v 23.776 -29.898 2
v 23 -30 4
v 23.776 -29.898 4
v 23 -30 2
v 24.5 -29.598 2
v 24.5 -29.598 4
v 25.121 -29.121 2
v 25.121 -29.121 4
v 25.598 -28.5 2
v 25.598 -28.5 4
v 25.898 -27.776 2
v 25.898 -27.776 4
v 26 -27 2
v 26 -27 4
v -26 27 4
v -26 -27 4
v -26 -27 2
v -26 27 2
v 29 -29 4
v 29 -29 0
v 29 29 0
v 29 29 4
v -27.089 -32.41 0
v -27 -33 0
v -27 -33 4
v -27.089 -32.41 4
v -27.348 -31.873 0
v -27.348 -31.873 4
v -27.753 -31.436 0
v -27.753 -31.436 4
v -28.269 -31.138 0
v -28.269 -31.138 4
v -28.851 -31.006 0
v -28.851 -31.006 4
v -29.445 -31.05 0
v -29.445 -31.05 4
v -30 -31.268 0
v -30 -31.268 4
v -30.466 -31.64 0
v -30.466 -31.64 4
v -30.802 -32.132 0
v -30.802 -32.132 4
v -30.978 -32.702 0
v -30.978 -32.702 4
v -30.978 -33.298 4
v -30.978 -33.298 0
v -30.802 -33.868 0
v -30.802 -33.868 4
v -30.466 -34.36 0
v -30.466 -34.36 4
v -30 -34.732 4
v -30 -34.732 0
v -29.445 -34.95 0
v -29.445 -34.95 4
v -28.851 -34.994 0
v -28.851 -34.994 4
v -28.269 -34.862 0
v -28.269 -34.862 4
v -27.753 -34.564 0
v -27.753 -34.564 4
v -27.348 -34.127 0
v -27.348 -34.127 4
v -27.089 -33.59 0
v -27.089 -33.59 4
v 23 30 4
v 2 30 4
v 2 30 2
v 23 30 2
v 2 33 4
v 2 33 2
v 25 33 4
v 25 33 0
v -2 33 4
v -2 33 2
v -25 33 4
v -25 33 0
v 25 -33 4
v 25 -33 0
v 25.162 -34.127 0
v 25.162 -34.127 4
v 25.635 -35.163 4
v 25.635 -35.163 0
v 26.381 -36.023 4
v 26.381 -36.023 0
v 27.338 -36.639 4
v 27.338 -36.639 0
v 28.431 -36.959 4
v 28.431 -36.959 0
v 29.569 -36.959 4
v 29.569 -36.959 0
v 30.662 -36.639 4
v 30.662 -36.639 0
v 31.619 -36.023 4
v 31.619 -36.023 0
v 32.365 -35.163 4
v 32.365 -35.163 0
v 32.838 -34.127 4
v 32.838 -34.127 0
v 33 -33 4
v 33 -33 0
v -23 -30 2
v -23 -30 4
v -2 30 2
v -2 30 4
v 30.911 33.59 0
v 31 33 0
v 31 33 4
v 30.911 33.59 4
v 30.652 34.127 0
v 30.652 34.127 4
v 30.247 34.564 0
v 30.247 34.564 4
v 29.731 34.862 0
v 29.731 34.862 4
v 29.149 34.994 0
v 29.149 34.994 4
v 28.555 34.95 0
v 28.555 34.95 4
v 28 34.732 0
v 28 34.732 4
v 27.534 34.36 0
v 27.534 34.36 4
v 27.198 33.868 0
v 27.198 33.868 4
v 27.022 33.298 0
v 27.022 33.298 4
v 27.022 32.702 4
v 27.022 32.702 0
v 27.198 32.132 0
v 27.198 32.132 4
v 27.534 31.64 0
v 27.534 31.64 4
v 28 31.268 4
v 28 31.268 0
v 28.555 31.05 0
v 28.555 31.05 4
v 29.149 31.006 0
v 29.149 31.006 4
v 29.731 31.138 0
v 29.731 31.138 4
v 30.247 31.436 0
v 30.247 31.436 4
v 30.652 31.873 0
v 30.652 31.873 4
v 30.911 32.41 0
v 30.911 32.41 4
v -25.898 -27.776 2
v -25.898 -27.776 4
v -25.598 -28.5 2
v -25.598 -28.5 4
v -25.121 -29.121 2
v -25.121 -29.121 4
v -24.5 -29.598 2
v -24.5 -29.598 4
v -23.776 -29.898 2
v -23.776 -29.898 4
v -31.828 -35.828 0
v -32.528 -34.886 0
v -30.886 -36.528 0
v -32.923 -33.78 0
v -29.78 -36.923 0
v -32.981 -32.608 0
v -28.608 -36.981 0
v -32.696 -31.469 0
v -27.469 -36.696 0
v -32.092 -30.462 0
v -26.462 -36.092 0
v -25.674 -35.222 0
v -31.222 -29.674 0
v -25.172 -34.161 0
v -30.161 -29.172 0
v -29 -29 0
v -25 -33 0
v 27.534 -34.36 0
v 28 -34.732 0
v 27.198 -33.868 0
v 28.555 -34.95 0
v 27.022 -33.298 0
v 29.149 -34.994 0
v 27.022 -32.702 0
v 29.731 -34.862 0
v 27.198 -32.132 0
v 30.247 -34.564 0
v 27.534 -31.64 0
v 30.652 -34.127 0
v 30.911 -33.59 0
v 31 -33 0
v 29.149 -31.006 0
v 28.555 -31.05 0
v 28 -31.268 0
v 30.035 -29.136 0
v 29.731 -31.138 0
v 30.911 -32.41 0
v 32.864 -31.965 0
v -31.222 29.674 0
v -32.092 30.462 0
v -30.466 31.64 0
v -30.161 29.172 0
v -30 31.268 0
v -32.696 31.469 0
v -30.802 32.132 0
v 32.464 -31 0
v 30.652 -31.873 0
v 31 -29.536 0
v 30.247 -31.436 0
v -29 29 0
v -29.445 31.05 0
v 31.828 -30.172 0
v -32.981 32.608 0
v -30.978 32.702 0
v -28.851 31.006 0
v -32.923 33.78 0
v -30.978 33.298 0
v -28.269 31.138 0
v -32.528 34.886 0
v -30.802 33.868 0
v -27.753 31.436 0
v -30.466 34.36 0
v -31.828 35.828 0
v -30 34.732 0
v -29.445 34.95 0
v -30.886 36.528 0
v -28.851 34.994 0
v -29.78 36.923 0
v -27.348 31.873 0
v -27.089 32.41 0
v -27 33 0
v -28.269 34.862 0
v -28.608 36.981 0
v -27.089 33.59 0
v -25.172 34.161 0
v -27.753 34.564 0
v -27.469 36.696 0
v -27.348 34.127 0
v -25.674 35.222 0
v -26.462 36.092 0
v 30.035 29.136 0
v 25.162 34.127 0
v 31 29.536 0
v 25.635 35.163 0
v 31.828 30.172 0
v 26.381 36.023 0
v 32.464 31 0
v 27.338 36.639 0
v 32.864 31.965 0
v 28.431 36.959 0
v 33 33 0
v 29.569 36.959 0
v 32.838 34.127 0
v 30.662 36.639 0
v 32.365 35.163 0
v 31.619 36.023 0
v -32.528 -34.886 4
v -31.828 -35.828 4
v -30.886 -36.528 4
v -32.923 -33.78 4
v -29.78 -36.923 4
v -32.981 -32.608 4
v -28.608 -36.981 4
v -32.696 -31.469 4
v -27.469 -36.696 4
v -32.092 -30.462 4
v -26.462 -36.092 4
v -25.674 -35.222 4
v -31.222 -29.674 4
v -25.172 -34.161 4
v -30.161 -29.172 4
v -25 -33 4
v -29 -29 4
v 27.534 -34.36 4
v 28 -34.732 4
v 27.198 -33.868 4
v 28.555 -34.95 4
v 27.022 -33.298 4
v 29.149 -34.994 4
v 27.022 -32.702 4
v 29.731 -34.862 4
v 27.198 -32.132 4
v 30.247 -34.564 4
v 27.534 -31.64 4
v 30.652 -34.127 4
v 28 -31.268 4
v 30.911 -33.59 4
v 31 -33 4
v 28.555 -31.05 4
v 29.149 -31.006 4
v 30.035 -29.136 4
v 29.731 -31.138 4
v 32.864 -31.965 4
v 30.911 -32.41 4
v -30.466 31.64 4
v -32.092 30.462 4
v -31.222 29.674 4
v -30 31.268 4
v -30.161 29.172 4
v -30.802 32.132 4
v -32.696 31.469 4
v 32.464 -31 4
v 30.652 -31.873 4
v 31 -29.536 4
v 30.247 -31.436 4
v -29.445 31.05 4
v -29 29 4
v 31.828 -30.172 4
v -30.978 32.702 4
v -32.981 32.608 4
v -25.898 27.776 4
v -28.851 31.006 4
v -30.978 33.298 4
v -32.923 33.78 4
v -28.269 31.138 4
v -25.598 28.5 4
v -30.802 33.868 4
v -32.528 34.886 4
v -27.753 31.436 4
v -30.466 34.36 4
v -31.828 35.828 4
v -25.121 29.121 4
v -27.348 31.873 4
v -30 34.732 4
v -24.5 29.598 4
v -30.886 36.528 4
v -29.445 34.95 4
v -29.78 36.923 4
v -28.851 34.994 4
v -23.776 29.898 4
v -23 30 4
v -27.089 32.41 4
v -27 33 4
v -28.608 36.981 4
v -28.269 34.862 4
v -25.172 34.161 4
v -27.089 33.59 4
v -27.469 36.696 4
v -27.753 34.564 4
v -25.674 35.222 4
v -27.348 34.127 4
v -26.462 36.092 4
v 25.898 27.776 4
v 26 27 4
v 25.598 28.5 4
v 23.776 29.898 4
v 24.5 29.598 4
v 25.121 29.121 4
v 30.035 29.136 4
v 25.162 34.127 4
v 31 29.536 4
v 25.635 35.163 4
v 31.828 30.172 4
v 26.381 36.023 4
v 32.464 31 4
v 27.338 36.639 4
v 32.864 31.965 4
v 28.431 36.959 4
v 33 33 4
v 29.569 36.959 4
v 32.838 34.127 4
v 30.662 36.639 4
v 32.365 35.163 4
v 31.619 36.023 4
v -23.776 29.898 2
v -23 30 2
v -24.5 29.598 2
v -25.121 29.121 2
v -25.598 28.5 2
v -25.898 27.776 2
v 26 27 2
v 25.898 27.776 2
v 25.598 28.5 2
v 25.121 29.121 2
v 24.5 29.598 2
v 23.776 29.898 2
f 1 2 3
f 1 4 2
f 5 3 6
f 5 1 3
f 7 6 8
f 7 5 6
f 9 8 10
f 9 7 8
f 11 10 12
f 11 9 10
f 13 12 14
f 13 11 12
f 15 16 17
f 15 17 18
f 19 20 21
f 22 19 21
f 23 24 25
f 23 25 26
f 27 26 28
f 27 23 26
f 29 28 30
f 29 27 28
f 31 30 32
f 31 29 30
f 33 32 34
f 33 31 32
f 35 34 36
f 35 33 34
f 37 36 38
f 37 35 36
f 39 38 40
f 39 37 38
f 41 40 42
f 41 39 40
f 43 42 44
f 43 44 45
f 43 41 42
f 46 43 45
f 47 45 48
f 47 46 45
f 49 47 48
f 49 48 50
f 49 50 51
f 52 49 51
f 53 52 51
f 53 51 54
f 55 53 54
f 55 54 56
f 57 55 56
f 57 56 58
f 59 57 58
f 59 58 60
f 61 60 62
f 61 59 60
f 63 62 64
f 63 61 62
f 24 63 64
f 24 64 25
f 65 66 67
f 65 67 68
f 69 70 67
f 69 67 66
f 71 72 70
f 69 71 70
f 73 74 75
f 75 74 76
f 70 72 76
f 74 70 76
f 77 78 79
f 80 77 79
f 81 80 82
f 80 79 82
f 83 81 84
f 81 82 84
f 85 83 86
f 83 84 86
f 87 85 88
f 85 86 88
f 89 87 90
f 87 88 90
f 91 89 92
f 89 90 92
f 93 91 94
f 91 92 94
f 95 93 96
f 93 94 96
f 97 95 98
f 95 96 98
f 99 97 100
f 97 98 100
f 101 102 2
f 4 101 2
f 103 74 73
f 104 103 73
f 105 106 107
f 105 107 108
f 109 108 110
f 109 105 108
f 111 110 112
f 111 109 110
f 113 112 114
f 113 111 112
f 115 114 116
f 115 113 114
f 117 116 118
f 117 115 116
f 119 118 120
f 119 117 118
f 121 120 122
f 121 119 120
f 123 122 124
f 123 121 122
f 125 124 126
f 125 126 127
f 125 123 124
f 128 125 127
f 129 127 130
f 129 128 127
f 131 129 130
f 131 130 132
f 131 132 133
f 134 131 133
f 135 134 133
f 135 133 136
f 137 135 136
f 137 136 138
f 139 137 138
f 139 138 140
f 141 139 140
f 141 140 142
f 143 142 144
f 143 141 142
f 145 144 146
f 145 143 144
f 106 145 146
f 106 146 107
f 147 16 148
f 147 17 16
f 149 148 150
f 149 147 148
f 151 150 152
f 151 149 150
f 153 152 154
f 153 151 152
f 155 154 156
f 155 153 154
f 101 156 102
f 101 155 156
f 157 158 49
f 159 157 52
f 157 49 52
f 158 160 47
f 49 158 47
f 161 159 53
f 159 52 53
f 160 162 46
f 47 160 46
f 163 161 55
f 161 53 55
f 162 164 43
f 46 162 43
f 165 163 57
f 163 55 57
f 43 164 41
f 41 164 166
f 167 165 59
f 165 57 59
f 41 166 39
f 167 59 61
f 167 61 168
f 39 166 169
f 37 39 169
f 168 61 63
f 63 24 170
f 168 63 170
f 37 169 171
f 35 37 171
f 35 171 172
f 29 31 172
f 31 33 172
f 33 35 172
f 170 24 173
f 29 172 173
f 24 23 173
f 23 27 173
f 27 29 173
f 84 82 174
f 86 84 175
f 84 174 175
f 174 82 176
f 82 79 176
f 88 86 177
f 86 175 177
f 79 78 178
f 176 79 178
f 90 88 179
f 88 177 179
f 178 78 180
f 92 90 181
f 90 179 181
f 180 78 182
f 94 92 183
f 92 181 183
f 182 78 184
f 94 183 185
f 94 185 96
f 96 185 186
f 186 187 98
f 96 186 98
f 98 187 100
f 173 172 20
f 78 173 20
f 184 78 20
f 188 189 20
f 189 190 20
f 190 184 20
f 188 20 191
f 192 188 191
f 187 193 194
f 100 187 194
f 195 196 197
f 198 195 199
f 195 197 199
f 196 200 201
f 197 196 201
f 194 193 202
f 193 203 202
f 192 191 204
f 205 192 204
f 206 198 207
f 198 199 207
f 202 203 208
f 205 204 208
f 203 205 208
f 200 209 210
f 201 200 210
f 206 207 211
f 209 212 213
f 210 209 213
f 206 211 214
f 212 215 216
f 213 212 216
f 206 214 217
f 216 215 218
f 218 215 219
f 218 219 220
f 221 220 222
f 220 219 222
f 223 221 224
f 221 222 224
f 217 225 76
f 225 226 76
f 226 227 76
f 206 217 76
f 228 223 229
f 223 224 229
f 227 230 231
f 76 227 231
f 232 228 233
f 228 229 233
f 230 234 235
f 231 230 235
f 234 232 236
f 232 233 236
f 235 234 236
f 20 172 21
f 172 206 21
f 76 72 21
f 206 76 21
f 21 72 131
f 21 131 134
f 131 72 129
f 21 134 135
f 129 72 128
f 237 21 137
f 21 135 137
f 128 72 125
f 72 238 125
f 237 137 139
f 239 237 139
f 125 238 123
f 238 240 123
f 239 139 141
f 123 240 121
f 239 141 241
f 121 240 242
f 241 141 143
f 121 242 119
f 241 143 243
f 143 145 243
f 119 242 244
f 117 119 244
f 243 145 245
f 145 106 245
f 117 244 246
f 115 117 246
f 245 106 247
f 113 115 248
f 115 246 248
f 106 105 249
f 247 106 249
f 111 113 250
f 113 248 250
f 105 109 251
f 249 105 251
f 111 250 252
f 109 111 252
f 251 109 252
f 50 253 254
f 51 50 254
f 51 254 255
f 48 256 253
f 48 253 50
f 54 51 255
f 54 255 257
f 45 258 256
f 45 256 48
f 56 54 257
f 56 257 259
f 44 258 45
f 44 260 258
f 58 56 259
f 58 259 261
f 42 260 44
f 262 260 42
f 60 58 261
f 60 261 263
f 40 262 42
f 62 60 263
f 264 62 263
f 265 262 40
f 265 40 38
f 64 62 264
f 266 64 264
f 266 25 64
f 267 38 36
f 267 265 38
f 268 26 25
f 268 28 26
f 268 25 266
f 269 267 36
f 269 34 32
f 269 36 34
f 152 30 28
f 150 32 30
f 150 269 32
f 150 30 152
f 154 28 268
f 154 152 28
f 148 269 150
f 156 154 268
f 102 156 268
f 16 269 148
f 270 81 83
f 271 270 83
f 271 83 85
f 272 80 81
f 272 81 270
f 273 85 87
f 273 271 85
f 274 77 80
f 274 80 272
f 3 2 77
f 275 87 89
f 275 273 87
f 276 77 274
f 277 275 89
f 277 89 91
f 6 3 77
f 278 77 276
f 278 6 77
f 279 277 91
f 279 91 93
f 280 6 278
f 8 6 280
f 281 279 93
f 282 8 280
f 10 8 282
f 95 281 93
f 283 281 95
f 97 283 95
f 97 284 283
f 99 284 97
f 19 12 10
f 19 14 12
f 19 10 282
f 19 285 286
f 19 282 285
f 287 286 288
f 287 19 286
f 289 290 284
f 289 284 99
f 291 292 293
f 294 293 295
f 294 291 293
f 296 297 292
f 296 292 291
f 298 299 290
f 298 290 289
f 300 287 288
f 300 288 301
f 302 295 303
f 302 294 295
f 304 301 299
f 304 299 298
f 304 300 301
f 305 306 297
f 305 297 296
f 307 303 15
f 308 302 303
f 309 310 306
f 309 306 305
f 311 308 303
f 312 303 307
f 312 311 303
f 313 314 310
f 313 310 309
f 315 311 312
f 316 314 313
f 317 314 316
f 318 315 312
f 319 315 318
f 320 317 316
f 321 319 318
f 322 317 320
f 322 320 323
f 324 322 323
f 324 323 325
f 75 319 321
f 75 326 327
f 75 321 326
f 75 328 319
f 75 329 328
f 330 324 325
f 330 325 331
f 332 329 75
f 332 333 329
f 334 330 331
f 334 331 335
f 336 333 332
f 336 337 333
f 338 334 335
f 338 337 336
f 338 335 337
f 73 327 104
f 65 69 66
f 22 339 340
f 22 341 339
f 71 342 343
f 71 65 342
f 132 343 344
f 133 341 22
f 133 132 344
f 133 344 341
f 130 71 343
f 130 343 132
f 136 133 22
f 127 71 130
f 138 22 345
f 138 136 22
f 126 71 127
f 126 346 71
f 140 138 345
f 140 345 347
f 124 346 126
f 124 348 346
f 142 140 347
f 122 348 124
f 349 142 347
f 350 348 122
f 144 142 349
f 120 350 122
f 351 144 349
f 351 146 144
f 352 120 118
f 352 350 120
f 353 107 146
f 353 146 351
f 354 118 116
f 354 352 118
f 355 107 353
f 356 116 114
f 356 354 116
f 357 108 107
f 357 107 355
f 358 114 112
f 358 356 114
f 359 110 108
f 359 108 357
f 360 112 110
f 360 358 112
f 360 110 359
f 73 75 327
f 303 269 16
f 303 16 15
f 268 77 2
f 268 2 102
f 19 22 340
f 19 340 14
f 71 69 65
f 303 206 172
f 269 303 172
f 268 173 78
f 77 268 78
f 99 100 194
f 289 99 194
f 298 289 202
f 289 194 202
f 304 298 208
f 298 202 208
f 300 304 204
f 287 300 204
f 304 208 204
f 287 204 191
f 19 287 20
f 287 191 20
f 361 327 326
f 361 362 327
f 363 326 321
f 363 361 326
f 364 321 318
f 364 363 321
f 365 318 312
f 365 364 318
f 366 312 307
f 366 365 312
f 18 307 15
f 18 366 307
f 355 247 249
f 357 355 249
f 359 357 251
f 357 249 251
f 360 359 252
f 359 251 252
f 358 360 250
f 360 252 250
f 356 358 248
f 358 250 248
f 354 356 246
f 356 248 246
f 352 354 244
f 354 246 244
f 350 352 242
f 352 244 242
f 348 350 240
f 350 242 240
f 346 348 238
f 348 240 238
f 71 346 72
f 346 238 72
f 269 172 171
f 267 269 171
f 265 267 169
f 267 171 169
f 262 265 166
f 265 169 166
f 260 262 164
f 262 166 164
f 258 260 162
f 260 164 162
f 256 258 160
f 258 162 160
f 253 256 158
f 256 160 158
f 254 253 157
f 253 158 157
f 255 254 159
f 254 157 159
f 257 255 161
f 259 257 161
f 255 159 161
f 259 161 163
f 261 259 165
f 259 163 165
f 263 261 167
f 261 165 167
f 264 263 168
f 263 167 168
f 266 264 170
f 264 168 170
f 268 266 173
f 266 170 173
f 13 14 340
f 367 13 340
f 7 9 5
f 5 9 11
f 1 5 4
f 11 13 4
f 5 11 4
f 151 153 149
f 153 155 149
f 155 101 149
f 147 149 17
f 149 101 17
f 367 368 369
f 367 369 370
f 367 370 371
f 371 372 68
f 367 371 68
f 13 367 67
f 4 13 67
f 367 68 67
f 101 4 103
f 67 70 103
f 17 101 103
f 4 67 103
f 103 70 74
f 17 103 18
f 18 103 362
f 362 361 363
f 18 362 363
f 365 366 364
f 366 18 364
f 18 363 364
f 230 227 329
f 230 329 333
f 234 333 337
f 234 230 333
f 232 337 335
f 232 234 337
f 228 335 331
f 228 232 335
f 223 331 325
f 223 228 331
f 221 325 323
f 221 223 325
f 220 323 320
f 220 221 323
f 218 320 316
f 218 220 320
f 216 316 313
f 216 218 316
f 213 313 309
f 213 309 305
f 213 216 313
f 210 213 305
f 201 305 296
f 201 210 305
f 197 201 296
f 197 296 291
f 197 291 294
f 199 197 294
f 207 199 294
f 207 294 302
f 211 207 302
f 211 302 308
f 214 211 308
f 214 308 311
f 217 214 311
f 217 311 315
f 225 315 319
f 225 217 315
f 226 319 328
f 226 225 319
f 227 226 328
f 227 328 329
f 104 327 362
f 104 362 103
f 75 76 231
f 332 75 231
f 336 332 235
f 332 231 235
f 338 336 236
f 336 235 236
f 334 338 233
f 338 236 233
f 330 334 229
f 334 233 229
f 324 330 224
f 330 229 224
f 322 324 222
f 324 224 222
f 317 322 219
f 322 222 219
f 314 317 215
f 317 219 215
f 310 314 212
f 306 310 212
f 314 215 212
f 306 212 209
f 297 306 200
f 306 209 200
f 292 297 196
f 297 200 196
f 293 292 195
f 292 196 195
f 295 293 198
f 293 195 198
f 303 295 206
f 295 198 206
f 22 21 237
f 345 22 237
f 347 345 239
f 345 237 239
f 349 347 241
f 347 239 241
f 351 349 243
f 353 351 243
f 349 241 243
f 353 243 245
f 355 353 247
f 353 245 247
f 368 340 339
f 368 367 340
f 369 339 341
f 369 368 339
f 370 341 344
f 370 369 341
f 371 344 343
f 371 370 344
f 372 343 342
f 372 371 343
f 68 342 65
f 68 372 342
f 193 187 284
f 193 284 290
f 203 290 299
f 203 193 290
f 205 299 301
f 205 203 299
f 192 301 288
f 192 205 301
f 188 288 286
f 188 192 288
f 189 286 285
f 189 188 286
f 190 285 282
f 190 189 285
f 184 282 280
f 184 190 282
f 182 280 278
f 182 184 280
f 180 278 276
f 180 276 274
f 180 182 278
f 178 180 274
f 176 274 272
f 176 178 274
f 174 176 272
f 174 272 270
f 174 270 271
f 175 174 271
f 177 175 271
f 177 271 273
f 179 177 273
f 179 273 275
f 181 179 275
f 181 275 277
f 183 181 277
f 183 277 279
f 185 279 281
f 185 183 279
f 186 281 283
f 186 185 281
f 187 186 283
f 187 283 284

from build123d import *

# Parameters (mm, degrees)
F2_DEPTH = 4
F3_W     = 4
F3_H     = 2
F4_DEPTH = 4
F5_W     = 52
F5_H     = 60
F6_DEPTH = 2
F7_R     = 2
F8_DEPTH = 4
F9_R     = 3


with BuildPart() as f2:
    # F1 (on Top) → F2 (new body)
    with BuildSketch(Plane.XY):
        with BuildLine():
            ThreePointArc((-29, 29), (-26.1715728753, 30.1715728753), (-25, 33))
            Line((-25, 33), (-29, 33))
            Line((-29, 33), (-29, 29))
        make_face()
        with BuildLine():
            Line((-29, 33), (-25, 33))
            ThreePointArc((-25, 33), (-31.8284271247, 35.8284271247), (-29, 29))
            Line((-29, 29), (-29, 33))
        make_face()
        with BuildLine():
            Line((25, 33), (-25, 33))
            ThreePointArc((-25, 33), (-26.1715728753, 30.1715728753), (-29, 29))
            Line((-29, 29), (-29, -29))
            ThreePointArc((-29, -29), (-26.1715728753, -30.1715728753), (-25, -33))
            Line((-25, -33), (25, -33))
            ThreePointArc((25, -33), (26.1715728753, -30.1715728753), (29, -29))
            Line((29, -29), (29, 29))
            ThreePointArc((29, 29), (26.1715728753, 30.1715728753), (25, 33))
        make_face()
        with BuildLine():
            ThreePointArc((33, 33), (29, 37), (25, 33))
            Line((25, 33), (29, 33))
            Line((29, 33), (29, 29))
            ThreePointArc((29, 29), (31.8284271247, 30.1715728753), (33, 33))
        make_face()
        with BuildLine():
            Line((29, 33), (25, 33))
            ThreePointArc((25, 33), (26.1715728753, 30.1715728753), (29, 29))
            Line((29, 29), (29, 33))
        make_face()
        with BuildLine():
            ThreePointArc((-25, -33), (-26.1715728753, -30.1715728753), (-29, -29))
            Line((-29, -29), (-29, -33))
            Line((-29, -33), (-25, -33))
        make_face()
        with BuildLine():
            Line((-29, -33), (-29, -29))
            ThreePointArc((-29, -29), (-31.8284271247, -35.8284271247), (-25, -33))
            Line((-25, -33), (-29, -33))
        make_face()
        with BuildLine():
            ThreePointArc((33, -33), (31.8284271247, -30.1715728753), (29, -29))
            Line((29, -29), (29, -33))
            Line((29, -33), (25, -33))
            ThreePointArc((25, -33), (29, -37), (33, -33))
        make_face()
        with BuildLine():
            Line((29, -33), (29, -29))
            ThreePointArc((29, -29), (26.1715728753, -30.1715728753), (25, -33))
            Line((25, -33), (29, -33))
        make_face()
    extrude(amount=F2_DEPTH)

    # F3 (on face) → F4 (cut)
    with BuildSketch(Plane(origin=(0, 33, 0), x_dir=(-1, 0, 0), z_dir=(0, 1, 0))):
        with Locations((0, 3)):
            Rectangle(F3_W, F3_H)
    extrude(amount=-F4_DEPTH, mode=Mode.SUBTRACT)

    # F5 (on face) → F6 (cut)
    with BuildSketch(Plane.XY.offset(4)):
        Rectangle(F5_W, F5_H)
    extrude(amount=-F6_DEPTH, mode=Mode.SUBTRACT)

    # F7 (on Top) → F8 (cut)
    with BuildSketch(Plane.XY):
        with Locations((29, 33)):
            Circle(F7_R)
        with Locations((-29, 33)):
            Circle(F7_R)
        with Locations((29, -33)):
            Circle(F7_R)
        with Locations((-29, -33)):
            Circle(F7_R)
    extrude(amount=F8_DEPTH, mode=Mode.SUBTRACT)

    # F9
    f9_edges = [f2.edges().sort_by_distance(p)[0] for p in [
        (26, -30, 3),
        (-26, -30, 3),
        (-26, 30, 3),
        (26, 30, 3),
    ]]
    fillet(f9_edges, radius=F9_R)


solid = f2.part
